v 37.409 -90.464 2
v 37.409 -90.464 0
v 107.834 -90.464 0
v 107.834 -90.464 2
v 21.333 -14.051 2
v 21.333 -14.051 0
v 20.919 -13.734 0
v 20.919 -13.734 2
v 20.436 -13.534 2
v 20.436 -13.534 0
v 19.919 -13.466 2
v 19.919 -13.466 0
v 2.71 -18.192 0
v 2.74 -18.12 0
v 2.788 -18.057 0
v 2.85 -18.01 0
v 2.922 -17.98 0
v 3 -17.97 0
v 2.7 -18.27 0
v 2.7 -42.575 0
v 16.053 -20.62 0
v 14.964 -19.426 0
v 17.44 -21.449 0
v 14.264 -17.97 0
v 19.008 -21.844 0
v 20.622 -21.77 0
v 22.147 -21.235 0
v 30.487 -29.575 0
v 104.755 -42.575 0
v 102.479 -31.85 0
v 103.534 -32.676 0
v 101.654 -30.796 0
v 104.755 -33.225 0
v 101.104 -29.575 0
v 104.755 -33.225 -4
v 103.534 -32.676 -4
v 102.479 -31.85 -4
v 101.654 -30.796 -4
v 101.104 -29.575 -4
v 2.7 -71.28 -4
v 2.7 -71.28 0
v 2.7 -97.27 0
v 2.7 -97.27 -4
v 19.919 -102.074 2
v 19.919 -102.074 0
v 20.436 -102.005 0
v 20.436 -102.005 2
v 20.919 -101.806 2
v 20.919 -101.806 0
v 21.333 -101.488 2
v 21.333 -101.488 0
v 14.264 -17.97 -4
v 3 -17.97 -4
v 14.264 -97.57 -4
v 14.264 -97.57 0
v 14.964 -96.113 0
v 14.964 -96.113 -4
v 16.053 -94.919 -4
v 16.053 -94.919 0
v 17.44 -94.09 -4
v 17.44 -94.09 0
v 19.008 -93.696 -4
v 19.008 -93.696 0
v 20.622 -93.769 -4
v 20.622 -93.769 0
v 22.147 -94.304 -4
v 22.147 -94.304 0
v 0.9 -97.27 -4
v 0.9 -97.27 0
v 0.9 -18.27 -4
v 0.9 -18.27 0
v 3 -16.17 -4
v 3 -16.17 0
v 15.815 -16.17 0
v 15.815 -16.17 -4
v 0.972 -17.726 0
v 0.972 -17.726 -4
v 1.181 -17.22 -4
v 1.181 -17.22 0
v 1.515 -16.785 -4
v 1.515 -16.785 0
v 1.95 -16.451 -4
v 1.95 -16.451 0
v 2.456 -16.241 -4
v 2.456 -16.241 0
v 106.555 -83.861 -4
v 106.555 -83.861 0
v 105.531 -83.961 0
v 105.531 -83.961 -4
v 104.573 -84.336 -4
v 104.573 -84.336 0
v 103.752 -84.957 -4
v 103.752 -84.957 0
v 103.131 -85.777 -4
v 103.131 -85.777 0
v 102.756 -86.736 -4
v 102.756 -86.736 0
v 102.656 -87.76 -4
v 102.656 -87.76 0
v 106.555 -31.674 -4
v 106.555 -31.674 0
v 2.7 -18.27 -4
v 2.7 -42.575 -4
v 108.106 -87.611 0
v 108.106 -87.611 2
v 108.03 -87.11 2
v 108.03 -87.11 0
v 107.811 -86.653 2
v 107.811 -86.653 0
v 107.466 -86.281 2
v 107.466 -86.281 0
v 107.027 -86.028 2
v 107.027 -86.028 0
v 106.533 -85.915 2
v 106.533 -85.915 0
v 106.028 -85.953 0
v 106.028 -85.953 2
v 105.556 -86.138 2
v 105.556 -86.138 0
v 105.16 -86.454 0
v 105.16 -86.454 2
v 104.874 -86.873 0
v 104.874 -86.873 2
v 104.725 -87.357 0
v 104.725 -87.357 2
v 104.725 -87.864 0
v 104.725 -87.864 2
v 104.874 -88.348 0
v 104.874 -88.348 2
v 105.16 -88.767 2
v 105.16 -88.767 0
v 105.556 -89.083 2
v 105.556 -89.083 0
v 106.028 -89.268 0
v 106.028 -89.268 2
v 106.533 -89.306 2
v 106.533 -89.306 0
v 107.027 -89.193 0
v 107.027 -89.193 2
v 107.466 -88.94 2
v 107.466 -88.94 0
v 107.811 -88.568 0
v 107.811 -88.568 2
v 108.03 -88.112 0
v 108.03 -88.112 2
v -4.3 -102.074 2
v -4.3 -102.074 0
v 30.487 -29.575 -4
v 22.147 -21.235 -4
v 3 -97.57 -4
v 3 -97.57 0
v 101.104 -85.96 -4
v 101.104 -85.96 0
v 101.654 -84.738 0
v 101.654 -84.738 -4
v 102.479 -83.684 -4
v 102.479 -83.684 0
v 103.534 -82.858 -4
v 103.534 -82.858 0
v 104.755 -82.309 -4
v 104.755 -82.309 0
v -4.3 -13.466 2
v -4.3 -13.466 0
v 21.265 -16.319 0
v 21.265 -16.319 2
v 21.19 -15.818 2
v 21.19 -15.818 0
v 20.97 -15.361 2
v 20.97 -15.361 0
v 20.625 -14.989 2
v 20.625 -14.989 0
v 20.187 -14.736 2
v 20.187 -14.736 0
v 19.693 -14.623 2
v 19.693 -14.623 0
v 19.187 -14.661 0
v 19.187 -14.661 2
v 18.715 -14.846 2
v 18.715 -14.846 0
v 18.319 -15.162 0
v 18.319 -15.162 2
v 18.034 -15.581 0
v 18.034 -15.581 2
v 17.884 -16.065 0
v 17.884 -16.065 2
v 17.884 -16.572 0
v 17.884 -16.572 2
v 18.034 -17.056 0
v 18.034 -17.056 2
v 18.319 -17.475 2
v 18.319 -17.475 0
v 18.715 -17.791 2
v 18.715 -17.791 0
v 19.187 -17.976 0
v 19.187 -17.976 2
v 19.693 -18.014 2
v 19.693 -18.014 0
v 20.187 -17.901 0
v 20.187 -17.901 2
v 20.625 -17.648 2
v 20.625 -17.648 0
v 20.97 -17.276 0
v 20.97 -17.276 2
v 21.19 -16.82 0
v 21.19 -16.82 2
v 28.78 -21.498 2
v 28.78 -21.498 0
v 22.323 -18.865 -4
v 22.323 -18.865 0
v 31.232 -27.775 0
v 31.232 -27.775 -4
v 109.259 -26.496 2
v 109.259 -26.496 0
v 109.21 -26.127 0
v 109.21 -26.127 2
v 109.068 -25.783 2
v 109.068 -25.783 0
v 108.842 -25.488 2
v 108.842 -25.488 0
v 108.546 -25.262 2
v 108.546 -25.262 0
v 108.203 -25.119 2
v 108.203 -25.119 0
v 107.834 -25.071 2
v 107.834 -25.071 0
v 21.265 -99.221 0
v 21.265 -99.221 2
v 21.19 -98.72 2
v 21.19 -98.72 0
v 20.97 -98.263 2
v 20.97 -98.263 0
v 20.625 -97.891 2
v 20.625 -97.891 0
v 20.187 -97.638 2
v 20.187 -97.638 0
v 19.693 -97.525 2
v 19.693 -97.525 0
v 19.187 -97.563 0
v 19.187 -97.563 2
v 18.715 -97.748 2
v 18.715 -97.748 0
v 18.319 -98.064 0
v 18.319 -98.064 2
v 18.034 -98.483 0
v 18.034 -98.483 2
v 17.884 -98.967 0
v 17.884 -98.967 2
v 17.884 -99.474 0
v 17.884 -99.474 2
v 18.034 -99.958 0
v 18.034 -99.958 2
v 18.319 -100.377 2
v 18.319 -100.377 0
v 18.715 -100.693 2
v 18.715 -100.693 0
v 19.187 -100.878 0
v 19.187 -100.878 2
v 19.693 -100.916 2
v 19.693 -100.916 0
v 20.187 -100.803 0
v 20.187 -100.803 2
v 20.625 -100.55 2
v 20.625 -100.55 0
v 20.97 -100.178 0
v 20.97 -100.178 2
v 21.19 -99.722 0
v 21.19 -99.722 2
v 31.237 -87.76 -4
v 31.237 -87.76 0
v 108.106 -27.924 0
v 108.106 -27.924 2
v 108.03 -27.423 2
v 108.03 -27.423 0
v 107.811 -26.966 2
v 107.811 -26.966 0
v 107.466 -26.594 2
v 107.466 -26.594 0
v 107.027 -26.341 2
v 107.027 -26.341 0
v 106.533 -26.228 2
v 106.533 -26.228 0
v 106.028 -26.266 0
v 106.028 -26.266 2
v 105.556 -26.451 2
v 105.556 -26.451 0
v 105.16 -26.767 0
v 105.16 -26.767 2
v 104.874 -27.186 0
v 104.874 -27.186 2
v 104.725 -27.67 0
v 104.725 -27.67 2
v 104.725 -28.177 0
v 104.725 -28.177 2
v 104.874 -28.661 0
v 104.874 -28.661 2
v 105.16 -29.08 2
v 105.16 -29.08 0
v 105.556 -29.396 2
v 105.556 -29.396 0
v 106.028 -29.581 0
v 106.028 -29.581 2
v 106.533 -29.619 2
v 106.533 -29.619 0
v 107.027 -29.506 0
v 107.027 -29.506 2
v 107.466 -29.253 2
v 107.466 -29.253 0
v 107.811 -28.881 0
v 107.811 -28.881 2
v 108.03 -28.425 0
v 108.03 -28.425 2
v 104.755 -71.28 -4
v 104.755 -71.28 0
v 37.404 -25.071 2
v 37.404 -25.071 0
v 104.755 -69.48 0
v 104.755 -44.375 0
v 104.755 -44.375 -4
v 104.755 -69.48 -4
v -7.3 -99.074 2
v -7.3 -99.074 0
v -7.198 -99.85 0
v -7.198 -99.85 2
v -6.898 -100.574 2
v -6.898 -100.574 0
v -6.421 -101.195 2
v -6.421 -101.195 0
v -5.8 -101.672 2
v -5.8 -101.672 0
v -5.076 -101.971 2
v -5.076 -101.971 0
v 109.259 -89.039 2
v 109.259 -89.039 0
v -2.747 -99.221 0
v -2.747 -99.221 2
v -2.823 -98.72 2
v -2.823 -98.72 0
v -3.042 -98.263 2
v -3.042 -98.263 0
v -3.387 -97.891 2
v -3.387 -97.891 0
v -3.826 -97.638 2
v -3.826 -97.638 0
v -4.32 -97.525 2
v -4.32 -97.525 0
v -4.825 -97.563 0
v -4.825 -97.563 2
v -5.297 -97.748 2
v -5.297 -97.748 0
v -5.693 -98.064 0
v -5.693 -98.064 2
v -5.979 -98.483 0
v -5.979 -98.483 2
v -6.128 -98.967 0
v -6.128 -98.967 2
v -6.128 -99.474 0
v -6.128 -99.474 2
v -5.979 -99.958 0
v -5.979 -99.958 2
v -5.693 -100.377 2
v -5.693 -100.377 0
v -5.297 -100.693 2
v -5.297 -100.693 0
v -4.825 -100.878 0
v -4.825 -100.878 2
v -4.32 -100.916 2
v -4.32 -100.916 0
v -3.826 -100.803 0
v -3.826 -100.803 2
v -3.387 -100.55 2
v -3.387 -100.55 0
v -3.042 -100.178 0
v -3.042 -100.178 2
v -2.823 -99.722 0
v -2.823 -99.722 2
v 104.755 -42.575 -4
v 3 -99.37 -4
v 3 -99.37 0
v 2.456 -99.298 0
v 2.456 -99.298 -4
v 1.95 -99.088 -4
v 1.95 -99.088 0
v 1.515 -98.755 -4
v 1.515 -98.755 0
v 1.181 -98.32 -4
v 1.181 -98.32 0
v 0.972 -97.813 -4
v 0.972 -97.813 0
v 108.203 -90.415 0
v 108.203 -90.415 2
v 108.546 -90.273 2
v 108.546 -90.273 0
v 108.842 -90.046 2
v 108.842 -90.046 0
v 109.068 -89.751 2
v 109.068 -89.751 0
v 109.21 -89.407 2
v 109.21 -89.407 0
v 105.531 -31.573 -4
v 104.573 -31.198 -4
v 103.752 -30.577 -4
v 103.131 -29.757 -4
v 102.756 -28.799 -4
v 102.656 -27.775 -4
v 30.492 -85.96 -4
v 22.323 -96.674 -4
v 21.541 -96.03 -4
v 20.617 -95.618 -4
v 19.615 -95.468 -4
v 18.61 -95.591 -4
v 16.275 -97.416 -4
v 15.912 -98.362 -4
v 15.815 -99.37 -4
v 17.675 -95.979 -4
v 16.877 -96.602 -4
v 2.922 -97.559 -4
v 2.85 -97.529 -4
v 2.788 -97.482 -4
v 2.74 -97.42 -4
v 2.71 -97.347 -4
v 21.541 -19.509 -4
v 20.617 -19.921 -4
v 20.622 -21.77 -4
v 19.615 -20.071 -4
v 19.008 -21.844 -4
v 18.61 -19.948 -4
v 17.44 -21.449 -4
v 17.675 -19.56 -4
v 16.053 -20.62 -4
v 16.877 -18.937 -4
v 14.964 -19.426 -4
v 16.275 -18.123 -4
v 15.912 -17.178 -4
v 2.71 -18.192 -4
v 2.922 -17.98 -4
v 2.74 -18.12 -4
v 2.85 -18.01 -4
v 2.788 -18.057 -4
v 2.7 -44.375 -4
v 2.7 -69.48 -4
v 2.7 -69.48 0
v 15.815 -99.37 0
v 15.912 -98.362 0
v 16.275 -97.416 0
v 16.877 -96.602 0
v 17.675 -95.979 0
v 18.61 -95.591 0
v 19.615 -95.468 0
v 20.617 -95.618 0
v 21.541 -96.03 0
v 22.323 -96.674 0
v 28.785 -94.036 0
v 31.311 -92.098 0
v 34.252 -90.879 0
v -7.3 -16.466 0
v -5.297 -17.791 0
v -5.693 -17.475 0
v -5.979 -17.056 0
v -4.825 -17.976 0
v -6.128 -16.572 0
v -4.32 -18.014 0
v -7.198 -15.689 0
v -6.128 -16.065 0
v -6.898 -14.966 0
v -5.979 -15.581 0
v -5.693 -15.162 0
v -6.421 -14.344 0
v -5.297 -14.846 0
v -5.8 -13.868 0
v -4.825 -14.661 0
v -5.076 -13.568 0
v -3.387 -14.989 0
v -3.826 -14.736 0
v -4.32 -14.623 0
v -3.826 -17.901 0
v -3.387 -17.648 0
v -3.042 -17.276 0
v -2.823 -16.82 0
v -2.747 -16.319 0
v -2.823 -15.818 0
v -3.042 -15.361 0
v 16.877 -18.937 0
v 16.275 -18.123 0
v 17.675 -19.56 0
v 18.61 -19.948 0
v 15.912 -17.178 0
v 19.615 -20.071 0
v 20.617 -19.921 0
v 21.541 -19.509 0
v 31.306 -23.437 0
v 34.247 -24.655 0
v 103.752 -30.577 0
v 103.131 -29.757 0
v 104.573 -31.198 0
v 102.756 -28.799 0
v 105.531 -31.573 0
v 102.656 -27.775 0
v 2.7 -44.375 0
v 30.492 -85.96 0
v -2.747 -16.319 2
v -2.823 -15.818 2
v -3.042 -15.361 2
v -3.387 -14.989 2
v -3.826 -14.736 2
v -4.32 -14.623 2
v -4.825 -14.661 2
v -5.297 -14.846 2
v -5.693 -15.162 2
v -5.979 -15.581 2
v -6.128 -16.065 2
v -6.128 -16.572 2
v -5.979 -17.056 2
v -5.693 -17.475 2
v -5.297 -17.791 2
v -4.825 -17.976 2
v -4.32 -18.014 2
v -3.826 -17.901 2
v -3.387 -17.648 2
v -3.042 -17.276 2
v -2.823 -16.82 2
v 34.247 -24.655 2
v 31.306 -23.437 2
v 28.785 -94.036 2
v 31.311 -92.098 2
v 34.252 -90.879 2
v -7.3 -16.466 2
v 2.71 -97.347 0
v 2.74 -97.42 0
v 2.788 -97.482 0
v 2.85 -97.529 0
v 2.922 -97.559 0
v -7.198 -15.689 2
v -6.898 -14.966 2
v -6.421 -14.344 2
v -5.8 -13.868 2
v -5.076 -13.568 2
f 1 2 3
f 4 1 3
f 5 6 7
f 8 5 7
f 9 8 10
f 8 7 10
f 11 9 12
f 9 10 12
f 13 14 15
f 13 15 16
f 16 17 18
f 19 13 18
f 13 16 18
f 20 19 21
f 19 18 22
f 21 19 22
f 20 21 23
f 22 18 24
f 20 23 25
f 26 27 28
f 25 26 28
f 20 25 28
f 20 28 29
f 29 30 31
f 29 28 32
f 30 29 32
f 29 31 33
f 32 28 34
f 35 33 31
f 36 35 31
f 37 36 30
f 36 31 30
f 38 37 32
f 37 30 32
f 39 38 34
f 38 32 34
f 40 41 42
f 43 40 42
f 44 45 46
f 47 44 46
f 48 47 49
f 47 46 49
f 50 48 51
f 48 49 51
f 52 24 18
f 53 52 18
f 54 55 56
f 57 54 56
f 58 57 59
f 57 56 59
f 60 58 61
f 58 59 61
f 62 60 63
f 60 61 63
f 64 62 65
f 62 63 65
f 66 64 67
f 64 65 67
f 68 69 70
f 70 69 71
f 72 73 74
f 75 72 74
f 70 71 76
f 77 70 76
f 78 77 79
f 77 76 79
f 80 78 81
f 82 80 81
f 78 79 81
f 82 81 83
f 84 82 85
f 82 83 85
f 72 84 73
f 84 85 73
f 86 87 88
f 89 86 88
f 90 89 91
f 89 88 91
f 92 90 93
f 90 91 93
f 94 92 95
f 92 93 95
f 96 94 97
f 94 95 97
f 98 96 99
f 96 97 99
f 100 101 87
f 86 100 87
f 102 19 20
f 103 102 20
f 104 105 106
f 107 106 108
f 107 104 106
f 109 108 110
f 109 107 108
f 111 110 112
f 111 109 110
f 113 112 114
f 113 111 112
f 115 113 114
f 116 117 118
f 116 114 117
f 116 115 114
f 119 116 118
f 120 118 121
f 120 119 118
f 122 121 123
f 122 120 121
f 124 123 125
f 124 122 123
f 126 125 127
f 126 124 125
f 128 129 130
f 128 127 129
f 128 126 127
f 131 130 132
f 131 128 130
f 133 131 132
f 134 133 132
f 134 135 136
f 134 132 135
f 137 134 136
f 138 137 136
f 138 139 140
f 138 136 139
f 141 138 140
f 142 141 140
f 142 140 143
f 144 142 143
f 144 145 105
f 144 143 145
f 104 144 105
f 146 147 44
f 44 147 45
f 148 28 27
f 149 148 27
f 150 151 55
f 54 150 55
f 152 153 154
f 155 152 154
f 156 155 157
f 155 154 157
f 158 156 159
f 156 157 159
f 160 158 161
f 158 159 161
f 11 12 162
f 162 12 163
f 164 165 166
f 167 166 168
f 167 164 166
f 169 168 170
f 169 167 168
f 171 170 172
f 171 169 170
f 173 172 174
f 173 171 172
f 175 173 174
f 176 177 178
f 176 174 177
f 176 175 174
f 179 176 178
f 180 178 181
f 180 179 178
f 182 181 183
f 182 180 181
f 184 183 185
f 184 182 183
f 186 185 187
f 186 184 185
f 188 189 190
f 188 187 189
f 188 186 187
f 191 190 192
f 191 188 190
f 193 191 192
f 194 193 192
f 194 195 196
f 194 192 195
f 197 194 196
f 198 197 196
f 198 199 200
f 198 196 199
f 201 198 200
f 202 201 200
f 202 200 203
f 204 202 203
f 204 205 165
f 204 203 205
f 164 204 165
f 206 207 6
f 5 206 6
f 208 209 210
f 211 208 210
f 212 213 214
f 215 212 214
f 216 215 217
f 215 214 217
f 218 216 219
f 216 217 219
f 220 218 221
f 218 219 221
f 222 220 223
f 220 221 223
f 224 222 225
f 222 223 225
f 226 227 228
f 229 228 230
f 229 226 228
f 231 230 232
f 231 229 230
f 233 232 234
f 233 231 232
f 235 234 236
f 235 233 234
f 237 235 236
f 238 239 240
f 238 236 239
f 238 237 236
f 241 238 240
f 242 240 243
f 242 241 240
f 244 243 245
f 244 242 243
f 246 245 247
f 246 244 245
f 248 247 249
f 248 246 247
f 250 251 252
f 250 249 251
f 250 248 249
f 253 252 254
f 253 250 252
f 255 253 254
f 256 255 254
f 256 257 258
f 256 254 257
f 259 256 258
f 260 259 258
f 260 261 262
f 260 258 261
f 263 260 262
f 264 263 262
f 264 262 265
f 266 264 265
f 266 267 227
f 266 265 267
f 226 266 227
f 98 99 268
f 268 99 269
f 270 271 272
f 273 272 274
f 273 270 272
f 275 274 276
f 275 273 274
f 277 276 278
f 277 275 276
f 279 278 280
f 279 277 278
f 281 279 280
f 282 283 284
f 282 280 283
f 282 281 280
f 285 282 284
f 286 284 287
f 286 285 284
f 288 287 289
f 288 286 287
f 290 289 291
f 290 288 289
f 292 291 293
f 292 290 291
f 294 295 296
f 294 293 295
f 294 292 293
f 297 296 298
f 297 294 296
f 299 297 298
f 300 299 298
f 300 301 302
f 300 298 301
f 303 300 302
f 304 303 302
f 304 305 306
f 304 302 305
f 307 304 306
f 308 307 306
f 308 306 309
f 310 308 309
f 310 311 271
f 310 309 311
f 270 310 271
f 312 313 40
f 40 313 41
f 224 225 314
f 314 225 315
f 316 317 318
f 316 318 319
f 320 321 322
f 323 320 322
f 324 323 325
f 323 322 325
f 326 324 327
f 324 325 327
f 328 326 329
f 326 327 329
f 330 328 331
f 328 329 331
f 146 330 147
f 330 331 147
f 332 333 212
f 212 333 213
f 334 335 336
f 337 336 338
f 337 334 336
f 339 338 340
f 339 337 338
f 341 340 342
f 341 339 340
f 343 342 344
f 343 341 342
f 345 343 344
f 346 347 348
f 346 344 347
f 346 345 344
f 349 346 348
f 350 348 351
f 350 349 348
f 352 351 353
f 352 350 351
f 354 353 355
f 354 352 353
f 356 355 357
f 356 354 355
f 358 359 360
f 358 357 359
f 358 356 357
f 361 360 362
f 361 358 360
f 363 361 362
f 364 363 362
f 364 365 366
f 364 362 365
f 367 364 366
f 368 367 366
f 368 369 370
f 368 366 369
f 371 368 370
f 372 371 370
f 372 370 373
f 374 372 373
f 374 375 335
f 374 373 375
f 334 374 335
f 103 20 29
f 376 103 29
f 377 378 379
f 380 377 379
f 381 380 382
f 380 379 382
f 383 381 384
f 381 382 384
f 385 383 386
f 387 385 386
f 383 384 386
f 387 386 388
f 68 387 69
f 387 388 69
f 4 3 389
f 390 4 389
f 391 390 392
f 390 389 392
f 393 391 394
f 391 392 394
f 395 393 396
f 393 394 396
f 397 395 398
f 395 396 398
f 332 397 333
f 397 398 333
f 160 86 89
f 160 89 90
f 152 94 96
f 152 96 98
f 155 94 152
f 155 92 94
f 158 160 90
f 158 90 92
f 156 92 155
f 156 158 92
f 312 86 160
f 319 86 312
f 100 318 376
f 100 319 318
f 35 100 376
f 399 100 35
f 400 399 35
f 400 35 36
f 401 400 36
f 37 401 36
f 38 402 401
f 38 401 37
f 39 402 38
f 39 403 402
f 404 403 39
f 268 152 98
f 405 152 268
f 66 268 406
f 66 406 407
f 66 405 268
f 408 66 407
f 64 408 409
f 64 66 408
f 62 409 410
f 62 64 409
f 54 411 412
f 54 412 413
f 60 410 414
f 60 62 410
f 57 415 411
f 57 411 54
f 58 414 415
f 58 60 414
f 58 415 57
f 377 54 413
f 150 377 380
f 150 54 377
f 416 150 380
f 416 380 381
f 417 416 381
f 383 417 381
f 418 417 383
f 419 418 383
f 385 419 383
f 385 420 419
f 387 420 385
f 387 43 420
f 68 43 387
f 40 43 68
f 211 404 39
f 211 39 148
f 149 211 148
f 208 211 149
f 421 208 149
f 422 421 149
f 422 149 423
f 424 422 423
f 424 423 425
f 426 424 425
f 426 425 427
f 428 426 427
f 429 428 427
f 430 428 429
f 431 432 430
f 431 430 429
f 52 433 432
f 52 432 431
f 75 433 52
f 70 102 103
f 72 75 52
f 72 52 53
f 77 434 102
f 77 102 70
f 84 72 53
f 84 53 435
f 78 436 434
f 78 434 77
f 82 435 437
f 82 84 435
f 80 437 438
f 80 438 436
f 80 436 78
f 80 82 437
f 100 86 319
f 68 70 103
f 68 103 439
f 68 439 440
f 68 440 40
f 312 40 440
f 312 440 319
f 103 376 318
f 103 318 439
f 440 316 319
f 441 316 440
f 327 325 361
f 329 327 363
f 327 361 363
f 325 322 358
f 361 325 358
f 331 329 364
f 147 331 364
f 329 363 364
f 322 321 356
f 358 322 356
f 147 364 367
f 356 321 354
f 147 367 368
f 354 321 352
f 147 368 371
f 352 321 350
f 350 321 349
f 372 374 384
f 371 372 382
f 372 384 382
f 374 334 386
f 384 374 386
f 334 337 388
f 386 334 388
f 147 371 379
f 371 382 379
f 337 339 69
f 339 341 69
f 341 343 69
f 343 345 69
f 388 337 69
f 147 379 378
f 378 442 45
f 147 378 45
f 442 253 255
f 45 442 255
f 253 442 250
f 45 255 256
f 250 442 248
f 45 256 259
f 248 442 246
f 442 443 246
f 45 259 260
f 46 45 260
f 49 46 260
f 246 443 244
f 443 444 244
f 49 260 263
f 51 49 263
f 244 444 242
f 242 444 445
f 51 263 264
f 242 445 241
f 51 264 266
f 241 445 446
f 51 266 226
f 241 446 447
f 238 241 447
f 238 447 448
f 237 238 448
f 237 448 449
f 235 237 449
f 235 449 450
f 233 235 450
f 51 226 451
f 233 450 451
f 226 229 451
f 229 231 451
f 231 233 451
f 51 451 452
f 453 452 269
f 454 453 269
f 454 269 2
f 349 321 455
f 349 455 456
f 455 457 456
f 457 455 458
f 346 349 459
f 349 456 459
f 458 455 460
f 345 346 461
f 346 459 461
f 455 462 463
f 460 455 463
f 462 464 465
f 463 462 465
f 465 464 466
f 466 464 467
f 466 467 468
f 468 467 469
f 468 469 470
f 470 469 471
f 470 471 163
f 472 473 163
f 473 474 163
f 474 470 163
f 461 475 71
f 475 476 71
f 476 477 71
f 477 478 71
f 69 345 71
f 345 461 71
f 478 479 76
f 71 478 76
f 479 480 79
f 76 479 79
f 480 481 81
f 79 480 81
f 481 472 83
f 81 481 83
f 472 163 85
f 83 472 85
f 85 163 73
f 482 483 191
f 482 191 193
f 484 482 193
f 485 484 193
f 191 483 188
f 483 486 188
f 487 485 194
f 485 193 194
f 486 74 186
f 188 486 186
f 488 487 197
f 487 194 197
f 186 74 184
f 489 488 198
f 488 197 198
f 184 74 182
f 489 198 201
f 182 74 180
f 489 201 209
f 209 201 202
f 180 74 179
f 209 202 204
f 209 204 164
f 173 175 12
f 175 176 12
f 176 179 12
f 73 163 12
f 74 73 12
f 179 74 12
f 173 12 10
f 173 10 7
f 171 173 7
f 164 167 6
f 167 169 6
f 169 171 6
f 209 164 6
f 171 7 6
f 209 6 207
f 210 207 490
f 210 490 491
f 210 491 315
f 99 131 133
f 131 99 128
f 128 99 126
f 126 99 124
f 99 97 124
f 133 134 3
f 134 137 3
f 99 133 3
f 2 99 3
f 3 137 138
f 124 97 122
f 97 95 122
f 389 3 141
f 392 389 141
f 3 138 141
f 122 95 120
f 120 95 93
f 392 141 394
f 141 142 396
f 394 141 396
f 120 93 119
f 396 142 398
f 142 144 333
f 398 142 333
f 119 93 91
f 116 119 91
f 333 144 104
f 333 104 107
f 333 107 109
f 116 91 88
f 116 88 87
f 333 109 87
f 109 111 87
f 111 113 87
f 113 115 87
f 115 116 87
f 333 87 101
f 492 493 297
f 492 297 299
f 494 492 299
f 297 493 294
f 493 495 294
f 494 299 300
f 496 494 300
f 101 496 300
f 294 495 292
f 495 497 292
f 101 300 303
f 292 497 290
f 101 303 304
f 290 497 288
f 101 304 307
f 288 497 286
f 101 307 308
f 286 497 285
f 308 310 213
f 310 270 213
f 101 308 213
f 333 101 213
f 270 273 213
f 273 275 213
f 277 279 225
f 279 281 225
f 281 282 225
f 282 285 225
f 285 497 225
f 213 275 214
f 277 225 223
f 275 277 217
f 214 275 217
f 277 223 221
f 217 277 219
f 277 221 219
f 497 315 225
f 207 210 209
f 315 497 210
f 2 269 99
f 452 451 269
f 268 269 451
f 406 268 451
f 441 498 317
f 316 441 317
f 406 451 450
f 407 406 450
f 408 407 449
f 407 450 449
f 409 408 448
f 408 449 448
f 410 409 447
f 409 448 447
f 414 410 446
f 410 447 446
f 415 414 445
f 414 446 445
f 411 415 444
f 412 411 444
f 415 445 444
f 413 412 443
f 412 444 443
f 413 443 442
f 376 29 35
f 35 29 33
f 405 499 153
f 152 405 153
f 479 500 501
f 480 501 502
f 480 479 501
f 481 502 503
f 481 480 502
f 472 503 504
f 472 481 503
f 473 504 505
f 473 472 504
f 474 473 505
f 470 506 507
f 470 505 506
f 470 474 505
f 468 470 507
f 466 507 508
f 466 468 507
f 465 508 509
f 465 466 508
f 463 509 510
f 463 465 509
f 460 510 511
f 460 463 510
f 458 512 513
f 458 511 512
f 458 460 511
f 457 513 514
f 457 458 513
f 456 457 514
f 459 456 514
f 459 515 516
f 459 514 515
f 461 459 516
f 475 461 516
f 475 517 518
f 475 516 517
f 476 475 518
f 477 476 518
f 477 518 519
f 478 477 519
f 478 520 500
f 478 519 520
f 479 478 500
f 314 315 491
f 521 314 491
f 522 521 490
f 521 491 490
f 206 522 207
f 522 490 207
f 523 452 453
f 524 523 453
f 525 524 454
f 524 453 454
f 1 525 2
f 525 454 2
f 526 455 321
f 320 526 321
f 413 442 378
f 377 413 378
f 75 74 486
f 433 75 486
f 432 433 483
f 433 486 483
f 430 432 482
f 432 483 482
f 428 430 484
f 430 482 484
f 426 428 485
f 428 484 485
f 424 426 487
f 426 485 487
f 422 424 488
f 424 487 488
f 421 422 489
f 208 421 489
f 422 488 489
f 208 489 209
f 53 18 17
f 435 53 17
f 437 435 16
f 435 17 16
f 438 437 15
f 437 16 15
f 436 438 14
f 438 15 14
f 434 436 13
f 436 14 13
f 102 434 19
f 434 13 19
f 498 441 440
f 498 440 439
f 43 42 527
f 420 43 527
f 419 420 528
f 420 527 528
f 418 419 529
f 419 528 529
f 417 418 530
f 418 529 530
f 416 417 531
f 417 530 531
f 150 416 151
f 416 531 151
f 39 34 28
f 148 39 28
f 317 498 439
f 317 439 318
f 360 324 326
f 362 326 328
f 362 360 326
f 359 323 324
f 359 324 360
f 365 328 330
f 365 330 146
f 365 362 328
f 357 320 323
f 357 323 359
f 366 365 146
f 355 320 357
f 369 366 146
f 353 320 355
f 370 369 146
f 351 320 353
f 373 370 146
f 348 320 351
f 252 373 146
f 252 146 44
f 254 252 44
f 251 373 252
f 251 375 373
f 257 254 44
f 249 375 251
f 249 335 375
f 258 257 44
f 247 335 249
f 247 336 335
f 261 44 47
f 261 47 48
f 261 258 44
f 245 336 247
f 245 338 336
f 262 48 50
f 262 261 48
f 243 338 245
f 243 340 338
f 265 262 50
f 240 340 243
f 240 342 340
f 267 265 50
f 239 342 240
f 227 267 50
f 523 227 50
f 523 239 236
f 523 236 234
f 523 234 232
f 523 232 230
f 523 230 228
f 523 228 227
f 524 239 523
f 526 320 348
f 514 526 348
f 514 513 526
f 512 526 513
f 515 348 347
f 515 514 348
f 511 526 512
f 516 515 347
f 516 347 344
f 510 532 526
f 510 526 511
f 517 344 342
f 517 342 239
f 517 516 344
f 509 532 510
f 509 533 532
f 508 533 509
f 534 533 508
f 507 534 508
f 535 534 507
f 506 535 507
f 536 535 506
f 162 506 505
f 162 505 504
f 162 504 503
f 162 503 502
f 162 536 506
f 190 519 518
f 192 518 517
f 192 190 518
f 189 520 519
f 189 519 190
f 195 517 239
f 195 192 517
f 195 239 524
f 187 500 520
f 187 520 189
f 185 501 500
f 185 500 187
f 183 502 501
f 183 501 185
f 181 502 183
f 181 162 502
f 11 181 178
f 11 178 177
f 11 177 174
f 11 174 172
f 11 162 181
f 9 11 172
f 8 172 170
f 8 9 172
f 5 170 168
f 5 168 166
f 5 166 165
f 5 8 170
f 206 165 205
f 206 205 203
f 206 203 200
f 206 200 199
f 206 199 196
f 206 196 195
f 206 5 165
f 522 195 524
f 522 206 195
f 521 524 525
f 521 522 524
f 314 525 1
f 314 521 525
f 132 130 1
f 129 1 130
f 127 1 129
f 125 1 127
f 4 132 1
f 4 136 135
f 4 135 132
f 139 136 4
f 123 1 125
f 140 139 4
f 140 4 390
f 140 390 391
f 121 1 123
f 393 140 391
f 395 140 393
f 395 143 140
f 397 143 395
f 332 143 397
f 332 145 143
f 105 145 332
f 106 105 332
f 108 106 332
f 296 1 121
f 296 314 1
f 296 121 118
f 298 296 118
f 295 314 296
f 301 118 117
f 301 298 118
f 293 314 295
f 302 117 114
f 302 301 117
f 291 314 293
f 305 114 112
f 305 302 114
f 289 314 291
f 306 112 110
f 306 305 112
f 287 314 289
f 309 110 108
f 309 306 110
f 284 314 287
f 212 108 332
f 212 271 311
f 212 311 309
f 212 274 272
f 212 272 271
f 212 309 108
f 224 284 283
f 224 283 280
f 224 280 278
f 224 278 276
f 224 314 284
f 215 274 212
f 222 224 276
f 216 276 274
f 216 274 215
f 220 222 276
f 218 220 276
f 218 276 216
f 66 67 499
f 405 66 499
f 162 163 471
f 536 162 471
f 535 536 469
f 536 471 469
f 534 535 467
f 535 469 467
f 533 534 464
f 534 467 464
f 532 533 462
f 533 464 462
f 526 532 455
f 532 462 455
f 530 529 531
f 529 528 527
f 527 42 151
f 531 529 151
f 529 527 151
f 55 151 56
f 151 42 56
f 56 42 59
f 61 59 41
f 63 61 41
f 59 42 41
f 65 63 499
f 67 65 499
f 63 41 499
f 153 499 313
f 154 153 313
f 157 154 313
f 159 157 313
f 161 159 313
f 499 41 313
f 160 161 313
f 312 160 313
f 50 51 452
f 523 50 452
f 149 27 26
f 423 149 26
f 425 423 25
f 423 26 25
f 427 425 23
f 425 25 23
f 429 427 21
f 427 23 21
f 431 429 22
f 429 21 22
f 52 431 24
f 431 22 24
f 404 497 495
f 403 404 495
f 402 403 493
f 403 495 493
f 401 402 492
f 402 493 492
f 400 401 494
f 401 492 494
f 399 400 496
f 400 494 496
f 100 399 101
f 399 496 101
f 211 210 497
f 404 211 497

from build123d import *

# Parameters (mm, degrees)
BOSS_EXTRUDE1_DEPTH = 2
BOSS_EXTRUDE2_DEPTH = 4
SKETCH1_4_R         = 1.7
CUT_EXTRUDE1_DEPTH  = 10


with BuildPart() as part:
    # Sketch1 → Boss-Extrude1 (new body)
    with BuildSketch(Plane.XY):
        with BuildLine():
            Line((28.78011557, -21.498473491), (21.333027704, -14.051385626))
            ThreePointArc((21.333027704, -14.051385626), (20.684181007, -13.617840123), (19.918814142, -13.465599188))
            Line((19.918814142, -13.465599188), (-4.3, -13.465599188))
            ThreePointArc((-4.3, -13.465599188), (-6.421320344, -14.344278845), (-7.3, -16.465599188))
            Line((-7.3, -16.465599188), (-7.3, -99.073599188))
            ThreePointArc((-7.3, -99.073599188), (-6.421320344, -101.194919532), (-4.3, -102.073599188))
            Line((-4.3, -102.073599188), (19.918814142, -102.073599188))
            ThreePointArc((19.918814142, -102.073599188), (20.684181007, -101.921358253), (21.333027704, -101.48781275))
            Line((21.333027704, -101.48781275), (28.78511557, -94.035724885))
            ThreePointArc((28.78511557, -94.035724885), (32.741782732, -91.39196441), (37.408989873, -90.463599188))
            Line((37.408989873, -90.463599188), (107.834, -90.463599188))
            ThreePointArc((107.834, -90.463599188), (108.841627163, -90.046226351), (109.259, -89.038599188))
            Line((109.259, -89.038599188), (109.259, -26.495599188))
            ThreePointArc((109.259, -26.495599188), (108.841627163, -25.487972025), (107.834, -25.070599188))
            Line((107.834, -25.070599188), (37.403989873, -25.070599188))
            ThreePointArc((37.403989873, -25.070599188), (32.736782732, -24.142233967), (28.78011557, -21.498473491))
        make_face()
    extrude(amount=BOSS_EXTRUDE1_DEPTH)

    # Sketch1<3> → Boss-Extrude2 (add)
    with BuildSketch(Plane.XY):
        with BuildLine():
            Line((3, -16.169599188), (15.815448907, -16.169599188))
            ThreePointArc((15.815448907, -16.169599188), (18.129279051, -19.785919074), (22.322528351, -18.864919746))
            Line((22.322528351, -18.864919746), (31.232207794, -27.774599188))
            Line((31.232207794, -27.774599188), (102.655958934, -27.774599188))
            ThreePointArc((102.655958934, -27.774599188), (103.75222825, -30.577370938), (106.555, -31.673640255))
            Line((106.555, -31.673640255), (106.555, -83.860558122))
            ThreePointArc((106.555, -83.860558122), (103.75222825, -84.956827438), (102.655958934, -87.759599188))
            Line((102.655958934, -87.759599188), (31.237207794, -87.759599188))
            Line((31.237207794, -87.759599188), (22.322528351, -96.674278631))
            ThreePointArc((22.322528351, -96.674278631), (18.129279051, -95.753279303), (15.815448907, -99.369599188))
            Line((15.815448907, -99.369599188), (3, -99.369599188))
            ThreePointArc((3, -99.369599188), (1.51507576, -98.754523429), (0.9, -97.269599188))
            Line((0.9, -97.269599188), (0.9, -18.269599188))
            ThreePointArc((0.9, -18.269599188), (1.51507576, -16.784674948), (3, -16.169599188))
        make_face()
        with BuildLine():
            ThreePointArc((3, -17.969599188), (2.787867966, -18.057467154), (2.7, -18.269599188))
            Line((2.7, -18.269599188), (2.7, -42.574599188))
            Line((2.7, -42.574599188), (22, -42.574599188))
            Line((22, -42.574599188), (90.115, -42.574599188))
            Line((90.115, -42.574599188), (104.755, -42.574599188))
            Line((104.755, -42.574599188), (104.755, -33.225486399))
            ThreePointArc((104.755, -33.225486399), (102.479436044, -31.850163144), (101.104112789, -29.574599188))
            Line((101.104112789, -29.574599188), (30.486623382, -29.574599188))
            Line((30.486623382, -29.574599188), (22.147057077, -21.235032884))
            ThreePointArc((22.147057077, -21.235032884), (17.440448873, -21.448902232), (14.263602762, -17.969599188))
            Line((14.263602762, -17.969599188), (3, -17.969599188))
        make_face(mode=Mode.SUBTRACT)
        with BuildLine():
            ThreePointArc((2.7, -97.269599188), (2.787867966, -97.481731222), (3, -97.569599188))
            Line((3, -97.569599188), (14.263602762, -97.569599188))
            ThreePointArc((14.263602762, -97.569599188), (17.440448873, -94.090296144), (22.147057077, -94.304165492))
            Line((22.147057077, -94.304165492), (30.491623382, -85.959599188))
            Line((30.491623382, -85.959599188), (101.104112789, -85.959599188))
            ThreePointArc((101.104112789, -85.959599188), (102.479436044, -83.684035232), (104.755, -82.308711977))
            Line((104.755, -82.308711977), (104.755, -71.279599188))
            Line((104.755, -71.279599188), (90.115, -71.279599188))
            Line((90.115, -71.279599188), (22, -71.279599188))
            Line((22, -71.279599188), (2.7, -71.279599188))
            Line((2.7, -71.279599188), (2.7, -97.269599188))
        make_face(mode=Mode.SUBTRACT)
        Polygon((22, -69.479599188), (2.7, -69.479599188), (2.7, -44.374599188), (22, -44.374599188), (90.115, -44.374599188), (104.755, -44.374599188), (104.755, -69.479599188), (90.115, -69.479599188), align=None, mode=Mode.SUBTRACT)
    extrude(amount=-BOSS_EXTRUDE2_DEPTH)

    # Sketch1<4> → Cut-Extrude1 (cut)
    with BuildSketch(Plane.XY):
        with Locations((106.406, -27.923599188)):
            Circle(SKETCH1_4_R)
        with Locations((106.406, -87.610599188)):
            Circle(SKETCH1_4_R)
        with Locations((19.565489973, -99.220599188)):
            Circle(SKETCH1_4_R)
        with Locations((-4.447, -99.220599188)):
            Circle(SKETCH1_4_R)
        with Locations((-4.447, -16.318599188)):
            Circle(SKETCH1_4_R)
        with Locations((19.565489973, -16.318599188)):
            Circle(SKETCH1_4_R)
    extrude(amount=CUT_EXTRUDE1_DEPTH, mode=Mode.SUBTRACT)


solid = part.part
